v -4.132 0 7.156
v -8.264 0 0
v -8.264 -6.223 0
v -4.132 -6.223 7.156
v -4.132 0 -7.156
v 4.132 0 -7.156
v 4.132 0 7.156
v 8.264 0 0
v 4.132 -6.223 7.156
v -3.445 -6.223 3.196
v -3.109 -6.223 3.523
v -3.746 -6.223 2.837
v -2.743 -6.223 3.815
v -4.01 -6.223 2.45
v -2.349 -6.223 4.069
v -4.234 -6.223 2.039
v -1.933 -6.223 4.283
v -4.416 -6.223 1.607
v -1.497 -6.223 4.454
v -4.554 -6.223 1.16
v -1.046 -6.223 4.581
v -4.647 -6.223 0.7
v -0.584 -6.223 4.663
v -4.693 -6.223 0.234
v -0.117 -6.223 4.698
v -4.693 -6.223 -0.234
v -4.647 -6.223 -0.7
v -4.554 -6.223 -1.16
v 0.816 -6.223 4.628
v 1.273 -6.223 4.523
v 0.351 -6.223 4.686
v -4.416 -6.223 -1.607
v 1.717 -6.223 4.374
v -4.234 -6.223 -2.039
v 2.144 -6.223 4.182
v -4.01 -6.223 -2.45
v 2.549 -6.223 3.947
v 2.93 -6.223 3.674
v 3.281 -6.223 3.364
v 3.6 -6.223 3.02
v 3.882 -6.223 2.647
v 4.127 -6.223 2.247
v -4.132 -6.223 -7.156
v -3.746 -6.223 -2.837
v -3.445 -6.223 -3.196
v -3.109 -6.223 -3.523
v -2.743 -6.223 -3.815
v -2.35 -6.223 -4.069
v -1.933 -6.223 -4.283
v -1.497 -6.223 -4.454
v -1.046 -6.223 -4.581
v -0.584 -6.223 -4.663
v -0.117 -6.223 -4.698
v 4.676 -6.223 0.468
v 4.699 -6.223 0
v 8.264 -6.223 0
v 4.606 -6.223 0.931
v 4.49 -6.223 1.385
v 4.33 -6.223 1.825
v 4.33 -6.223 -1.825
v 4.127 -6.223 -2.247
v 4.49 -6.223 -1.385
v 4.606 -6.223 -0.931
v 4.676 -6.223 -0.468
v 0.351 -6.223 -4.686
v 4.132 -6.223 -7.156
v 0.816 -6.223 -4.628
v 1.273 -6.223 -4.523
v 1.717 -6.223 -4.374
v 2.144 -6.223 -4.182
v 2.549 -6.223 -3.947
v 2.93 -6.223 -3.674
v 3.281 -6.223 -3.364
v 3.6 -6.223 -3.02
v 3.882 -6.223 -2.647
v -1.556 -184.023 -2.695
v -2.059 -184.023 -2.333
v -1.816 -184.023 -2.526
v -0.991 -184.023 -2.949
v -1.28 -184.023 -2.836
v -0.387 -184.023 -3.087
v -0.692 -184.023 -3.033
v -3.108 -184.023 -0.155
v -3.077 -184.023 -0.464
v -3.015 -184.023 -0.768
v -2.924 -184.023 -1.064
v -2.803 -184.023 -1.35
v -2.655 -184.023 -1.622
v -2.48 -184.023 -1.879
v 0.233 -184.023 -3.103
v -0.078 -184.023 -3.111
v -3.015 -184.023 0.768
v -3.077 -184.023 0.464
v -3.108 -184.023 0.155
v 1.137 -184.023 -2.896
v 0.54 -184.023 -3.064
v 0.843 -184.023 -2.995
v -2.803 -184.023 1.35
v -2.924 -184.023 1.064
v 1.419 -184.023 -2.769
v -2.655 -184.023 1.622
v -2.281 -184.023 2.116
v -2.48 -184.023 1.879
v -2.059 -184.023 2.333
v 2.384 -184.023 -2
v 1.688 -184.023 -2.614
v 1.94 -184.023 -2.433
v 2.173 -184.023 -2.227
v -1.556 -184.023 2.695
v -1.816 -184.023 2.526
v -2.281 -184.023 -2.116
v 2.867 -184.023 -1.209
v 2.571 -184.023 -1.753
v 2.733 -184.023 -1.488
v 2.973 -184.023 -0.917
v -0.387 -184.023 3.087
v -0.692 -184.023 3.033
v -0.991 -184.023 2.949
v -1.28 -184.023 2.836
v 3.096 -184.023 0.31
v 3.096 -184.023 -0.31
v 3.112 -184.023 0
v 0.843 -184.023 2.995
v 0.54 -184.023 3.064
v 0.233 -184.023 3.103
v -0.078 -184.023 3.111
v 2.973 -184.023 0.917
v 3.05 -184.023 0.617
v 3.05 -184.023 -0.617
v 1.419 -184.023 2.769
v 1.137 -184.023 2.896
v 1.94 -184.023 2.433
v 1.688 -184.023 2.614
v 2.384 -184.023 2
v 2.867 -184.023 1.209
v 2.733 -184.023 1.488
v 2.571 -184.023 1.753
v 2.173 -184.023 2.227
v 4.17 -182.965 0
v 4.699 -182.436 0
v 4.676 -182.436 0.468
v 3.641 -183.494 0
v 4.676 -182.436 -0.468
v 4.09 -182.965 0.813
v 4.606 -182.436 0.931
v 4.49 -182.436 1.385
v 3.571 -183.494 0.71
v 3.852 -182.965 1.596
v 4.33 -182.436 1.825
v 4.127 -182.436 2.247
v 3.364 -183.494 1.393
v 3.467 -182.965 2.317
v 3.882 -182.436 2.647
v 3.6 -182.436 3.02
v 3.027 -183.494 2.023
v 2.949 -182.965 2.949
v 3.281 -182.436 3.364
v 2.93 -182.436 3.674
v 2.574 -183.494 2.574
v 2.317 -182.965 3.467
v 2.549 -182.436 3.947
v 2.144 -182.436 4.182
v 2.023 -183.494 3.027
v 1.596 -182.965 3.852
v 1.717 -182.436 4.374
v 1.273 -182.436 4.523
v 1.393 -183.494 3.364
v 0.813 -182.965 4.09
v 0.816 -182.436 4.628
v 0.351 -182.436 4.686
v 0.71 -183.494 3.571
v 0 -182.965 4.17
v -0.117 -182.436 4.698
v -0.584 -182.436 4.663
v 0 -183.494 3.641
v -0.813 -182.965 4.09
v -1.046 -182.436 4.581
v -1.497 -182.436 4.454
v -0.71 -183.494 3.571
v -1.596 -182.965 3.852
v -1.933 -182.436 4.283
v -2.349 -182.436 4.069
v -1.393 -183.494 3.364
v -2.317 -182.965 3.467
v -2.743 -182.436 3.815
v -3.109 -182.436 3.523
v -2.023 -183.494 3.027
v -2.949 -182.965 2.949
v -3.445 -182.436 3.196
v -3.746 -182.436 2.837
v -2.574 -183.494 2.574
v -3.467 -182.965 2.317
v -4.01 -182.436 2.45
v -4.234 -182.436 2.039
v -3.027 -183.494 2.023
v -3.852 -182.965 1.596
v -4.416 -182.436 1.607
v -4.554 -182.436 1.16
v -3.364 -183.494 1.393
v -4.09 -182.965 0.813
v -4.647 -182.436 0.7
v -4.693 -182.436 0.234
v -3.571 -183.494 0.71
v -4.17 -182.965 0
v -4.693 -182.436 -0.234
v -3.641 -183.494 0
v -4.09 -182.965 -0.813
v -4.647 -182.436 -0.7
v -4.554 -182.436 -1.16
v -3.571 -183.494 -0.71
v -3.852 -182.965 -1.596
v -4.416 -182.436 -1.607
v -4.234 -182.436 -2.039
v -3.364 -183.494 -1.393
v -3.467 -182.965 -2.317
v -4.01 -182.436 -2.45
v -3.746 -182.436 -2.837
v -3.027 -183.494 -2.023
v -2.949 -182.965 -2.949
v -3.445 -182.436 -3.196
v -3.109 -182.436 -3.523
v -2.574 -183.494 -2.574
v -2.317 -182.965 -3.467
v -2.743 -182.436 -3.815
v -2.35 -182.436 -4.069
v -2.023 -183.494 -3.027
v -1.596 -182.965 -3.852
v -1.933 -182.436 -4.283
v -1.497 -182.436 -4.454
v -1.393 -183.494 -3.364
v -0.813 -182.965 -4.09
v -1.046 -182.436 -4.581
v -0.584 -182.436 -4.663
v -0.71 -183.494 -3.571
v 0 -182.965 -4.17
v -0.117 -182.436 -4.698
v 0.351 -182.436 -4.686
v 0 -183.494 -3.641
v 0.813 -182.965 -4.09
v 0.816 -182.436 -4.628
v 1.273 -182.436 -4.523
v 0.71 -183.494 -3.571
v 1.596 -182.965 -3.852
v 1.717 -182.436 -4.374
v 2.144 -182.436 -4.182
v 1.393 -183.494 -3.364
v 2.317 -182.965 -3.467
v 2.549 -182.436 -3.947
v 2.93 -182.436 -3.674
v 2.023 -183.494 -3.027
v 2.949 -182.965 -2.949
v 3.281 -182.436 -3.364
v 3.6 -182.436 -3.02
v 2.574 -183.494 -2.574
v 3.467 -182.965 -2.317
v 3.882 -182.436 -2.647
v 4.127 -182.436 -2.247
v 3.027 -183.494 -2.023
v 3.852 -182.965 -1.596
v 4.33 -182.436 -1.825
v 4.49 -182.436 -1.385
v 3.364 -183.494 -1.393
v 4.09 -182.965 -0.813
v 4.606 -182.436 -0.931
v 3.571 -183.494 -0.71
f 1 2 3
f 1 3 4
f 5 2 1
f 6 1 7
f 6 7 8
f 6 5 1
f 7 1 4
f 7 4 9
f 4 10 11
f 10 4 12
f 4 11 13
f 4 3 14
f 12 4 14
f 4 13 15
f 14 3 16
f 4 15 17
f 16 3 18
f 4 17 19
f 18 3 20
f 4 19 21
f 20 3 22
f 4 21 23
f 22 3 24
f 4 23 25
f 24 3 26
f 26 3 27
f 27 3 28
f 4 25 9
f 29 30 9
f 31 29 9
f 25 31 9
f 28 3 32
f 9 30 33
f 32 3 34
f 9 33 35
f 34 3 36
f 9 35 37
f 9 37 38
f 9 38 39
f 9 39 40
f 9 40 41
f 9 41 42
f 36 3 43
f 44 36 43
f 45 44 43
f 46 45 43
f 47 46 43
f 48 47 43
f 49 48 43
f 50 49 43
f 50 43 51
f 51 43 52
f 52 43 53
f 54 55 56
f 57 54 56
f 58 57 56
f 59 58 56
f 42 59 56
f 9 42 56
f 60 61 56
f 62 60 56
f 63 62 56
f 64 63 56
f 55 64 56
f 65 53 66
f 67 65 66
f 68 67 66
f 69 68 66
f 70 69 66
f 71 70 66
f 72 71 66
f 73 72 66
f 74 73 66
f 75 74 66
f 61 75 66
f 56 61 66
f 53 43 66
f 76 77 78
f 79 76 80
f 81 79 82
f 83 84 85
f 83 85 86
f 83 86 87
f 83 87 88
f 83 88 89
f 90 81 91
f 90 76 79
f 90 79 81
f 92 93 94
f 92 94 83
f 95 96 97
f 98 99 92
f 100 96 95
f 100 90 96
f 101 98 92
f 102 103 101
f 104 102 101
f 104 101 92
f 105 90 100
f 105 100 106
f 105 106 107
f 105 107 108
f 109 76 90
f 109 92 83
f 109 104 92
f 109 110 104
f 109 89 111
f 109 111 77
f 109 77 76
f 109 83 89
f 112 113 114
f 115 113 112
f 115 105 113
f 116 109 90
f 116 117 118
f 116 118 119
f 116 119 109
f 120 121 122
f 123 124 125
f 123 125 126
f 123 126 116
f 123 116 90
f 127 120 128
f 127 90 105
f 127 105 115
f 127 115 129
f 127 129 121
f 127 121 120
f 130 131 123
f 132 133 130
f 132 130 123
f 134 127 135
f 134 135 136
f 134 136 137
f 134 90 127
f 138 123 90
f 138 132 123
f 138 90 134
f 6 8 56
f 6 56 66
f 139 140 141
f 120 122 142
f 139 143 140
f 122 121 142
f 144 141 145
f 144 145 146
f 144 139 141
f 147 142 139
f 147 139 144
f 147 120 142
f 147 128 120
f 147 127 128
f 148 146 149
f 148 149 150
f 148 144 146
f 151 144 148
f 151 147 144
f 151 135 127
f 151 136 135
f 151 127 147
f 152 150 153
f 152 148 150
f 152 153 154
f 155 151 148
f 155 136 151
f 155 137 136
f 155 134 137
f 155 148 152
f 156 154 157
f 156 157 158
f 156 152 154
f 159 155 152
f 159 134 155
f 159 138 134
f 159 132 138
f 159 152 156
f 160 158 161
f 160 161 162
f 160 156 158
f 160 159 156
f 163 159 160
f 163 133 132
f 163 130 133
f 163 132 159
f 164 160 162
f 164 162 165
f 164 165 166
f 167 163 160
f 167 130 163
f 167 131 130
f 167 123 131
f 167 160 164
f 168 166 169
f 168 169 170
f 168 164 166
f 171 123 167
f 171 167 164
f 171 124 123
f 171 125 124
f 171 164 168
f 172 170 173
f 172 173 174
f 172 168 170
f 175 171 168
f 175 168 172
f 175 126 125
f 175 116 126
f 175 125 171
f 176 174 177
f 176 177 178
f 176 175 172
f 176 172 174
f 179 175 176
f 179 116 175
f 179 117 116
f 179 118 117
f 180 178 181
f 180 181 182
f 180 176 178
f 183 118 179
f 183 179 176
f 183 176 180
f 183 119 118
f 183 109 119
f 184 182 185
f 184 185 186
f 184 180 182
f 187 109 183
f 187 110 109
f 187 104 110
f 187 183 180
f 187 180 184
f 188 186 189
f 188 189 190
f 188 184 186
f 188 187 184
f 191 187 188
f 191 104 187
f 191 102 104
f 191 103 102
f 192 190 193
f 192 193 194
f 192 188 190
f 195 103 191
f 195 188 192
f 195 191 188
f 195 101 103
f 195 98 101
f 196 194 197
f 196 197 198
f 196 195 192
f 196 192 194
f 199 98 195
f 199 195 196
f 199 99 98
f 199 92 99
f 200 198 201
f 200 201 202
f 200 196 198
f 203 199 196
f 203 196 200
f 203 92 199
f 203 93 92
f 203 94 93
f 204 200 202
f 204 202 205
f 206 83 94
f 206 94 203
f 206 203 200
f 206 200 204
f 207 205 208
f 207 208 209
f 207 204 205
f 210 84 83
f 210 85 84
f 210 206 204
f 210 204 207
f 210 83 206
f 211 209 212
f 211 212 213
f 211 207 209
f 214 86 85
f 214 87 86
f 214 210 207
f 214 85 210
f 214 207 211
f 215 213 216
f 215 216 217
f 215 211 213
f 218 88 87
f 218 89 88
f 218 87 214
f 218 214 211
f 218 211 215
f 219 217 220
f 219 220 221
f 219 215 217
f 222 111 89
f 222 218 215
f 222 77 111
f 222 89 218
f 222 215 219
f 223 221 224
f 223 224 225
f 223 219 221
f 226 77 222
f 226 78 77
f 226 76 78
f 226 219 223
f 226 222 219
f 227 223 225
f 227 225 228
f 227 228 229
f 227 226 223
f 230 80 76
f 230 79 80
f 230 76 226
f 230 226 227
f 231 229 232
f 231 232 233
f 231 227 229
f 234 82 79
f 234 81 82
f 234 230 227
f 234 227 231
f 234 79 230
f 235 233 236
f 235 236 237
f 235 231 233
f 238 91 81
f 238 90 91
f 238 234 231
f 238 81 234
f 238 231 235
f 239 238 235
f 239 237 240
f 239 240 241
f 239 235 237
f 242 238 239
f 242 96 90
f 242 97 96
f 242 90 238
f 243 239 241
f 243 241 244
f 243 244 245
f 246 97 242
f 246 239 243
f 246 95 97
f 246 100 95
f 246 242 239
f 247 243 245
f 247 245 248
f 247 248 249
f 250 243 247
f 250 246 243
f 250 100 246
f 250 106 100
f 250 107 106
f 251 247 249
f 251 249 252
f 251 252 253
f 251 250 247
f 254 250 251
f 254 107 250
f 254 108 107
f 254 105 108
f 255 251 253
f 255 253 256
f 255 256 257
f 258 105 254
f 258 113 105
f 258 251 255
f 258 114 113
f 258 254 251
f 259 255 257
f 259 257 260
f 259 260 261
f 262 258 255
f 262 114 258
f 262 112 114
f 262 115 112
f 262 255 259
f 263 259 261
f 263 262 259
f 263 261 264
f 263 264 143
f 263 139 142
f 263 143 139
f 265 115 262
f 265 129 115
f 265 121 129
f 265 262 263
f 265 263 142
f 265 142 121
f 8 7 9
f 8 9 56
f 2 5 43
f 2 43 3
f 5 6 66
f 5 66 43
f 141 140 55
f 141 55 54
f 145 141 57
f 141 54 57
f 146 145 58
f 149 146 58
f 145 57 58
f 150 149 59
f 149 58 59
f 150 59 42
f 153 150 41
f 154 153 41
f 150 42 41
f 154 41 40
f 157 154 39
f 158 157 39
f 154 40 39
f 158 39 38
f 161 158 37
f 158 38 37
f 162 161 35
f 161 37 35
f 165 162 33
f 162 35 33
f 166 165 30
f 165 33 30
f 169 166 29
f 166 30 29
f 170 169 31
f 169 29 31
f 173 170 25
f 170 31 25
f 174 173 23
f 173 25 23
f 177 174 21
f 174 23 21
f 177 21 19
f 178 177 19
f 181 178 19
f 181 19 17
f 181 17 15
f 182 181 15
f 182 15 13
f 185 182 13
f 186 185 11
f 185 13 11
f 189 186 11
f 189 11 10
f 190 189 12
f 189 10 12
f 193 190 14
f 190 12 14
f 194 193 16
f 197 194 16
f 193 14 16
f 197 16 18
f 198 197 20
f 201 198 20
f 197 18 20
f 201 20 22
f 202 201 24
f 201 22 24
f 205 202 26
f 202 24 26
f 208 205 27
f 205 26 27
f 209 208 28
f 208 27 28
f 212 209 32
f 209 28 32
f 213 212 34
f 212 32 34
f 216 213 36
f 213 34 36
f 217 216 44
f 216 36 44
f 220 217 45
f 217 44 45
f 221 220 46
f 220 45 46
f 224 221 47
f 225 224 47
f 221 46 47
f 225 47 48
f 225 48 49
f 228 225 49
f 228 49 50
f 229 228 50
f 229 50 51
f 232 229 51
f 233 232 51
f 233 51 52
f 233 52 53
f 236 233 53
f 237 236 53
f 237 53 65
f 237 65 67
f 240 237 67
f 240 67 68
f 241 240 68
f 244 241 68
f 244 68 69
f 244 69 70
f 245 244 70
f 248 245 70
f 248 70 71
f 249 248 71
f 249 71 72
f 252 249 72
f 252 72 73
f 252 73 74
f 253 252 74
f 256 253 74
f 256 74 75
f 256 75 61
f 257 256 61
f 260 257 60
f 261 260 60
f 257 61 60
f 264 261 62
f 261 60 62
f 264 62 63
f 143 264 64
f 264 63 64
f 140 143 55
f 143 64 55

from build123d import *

# Parameters (mm, degrees)
EXTRUDE1_DEPTH = 6.223
SKETCH2_R      = 4.699
EXTRUDE2_DEPTH = 177.8
CHAMFER1_SIZE  = 1.5875


with BuildPart() as part:
    # Sketch1 → Extrude1 (new body)
    with BuildSketch(Plane(origin=(0, 0, 0), x_dir=(1, 0, 0), z_dir=(0, 1, 0))):
        Polygon((8.263556668, 0), (4.131778334, 7.15645), (-4.131778334, 7.15645), (-8.263556668, 0), (-4.131778334, -7.15645), (4.131778334, -7.15645), align=None)
    extrude(amount=-EXTRUDE1_DEPTH)

    # Sketch2 → Extrude2 (add)
    with BuildSketch(Plane.XZ.offset(6.223)):
        Circle(SKETCH2_R)
    extrude(amount=EXTRUDE2_DEPTH)

    # Chamfer1
    chamfer1_edges = [part.edges().sort_by_distance(p)[0] for p in [
        (-4.699, -184.023, 0),
    ]]
    chamfer(chamfer1_edges, length=CHAMFER1_SIZE)


solid = part.part
